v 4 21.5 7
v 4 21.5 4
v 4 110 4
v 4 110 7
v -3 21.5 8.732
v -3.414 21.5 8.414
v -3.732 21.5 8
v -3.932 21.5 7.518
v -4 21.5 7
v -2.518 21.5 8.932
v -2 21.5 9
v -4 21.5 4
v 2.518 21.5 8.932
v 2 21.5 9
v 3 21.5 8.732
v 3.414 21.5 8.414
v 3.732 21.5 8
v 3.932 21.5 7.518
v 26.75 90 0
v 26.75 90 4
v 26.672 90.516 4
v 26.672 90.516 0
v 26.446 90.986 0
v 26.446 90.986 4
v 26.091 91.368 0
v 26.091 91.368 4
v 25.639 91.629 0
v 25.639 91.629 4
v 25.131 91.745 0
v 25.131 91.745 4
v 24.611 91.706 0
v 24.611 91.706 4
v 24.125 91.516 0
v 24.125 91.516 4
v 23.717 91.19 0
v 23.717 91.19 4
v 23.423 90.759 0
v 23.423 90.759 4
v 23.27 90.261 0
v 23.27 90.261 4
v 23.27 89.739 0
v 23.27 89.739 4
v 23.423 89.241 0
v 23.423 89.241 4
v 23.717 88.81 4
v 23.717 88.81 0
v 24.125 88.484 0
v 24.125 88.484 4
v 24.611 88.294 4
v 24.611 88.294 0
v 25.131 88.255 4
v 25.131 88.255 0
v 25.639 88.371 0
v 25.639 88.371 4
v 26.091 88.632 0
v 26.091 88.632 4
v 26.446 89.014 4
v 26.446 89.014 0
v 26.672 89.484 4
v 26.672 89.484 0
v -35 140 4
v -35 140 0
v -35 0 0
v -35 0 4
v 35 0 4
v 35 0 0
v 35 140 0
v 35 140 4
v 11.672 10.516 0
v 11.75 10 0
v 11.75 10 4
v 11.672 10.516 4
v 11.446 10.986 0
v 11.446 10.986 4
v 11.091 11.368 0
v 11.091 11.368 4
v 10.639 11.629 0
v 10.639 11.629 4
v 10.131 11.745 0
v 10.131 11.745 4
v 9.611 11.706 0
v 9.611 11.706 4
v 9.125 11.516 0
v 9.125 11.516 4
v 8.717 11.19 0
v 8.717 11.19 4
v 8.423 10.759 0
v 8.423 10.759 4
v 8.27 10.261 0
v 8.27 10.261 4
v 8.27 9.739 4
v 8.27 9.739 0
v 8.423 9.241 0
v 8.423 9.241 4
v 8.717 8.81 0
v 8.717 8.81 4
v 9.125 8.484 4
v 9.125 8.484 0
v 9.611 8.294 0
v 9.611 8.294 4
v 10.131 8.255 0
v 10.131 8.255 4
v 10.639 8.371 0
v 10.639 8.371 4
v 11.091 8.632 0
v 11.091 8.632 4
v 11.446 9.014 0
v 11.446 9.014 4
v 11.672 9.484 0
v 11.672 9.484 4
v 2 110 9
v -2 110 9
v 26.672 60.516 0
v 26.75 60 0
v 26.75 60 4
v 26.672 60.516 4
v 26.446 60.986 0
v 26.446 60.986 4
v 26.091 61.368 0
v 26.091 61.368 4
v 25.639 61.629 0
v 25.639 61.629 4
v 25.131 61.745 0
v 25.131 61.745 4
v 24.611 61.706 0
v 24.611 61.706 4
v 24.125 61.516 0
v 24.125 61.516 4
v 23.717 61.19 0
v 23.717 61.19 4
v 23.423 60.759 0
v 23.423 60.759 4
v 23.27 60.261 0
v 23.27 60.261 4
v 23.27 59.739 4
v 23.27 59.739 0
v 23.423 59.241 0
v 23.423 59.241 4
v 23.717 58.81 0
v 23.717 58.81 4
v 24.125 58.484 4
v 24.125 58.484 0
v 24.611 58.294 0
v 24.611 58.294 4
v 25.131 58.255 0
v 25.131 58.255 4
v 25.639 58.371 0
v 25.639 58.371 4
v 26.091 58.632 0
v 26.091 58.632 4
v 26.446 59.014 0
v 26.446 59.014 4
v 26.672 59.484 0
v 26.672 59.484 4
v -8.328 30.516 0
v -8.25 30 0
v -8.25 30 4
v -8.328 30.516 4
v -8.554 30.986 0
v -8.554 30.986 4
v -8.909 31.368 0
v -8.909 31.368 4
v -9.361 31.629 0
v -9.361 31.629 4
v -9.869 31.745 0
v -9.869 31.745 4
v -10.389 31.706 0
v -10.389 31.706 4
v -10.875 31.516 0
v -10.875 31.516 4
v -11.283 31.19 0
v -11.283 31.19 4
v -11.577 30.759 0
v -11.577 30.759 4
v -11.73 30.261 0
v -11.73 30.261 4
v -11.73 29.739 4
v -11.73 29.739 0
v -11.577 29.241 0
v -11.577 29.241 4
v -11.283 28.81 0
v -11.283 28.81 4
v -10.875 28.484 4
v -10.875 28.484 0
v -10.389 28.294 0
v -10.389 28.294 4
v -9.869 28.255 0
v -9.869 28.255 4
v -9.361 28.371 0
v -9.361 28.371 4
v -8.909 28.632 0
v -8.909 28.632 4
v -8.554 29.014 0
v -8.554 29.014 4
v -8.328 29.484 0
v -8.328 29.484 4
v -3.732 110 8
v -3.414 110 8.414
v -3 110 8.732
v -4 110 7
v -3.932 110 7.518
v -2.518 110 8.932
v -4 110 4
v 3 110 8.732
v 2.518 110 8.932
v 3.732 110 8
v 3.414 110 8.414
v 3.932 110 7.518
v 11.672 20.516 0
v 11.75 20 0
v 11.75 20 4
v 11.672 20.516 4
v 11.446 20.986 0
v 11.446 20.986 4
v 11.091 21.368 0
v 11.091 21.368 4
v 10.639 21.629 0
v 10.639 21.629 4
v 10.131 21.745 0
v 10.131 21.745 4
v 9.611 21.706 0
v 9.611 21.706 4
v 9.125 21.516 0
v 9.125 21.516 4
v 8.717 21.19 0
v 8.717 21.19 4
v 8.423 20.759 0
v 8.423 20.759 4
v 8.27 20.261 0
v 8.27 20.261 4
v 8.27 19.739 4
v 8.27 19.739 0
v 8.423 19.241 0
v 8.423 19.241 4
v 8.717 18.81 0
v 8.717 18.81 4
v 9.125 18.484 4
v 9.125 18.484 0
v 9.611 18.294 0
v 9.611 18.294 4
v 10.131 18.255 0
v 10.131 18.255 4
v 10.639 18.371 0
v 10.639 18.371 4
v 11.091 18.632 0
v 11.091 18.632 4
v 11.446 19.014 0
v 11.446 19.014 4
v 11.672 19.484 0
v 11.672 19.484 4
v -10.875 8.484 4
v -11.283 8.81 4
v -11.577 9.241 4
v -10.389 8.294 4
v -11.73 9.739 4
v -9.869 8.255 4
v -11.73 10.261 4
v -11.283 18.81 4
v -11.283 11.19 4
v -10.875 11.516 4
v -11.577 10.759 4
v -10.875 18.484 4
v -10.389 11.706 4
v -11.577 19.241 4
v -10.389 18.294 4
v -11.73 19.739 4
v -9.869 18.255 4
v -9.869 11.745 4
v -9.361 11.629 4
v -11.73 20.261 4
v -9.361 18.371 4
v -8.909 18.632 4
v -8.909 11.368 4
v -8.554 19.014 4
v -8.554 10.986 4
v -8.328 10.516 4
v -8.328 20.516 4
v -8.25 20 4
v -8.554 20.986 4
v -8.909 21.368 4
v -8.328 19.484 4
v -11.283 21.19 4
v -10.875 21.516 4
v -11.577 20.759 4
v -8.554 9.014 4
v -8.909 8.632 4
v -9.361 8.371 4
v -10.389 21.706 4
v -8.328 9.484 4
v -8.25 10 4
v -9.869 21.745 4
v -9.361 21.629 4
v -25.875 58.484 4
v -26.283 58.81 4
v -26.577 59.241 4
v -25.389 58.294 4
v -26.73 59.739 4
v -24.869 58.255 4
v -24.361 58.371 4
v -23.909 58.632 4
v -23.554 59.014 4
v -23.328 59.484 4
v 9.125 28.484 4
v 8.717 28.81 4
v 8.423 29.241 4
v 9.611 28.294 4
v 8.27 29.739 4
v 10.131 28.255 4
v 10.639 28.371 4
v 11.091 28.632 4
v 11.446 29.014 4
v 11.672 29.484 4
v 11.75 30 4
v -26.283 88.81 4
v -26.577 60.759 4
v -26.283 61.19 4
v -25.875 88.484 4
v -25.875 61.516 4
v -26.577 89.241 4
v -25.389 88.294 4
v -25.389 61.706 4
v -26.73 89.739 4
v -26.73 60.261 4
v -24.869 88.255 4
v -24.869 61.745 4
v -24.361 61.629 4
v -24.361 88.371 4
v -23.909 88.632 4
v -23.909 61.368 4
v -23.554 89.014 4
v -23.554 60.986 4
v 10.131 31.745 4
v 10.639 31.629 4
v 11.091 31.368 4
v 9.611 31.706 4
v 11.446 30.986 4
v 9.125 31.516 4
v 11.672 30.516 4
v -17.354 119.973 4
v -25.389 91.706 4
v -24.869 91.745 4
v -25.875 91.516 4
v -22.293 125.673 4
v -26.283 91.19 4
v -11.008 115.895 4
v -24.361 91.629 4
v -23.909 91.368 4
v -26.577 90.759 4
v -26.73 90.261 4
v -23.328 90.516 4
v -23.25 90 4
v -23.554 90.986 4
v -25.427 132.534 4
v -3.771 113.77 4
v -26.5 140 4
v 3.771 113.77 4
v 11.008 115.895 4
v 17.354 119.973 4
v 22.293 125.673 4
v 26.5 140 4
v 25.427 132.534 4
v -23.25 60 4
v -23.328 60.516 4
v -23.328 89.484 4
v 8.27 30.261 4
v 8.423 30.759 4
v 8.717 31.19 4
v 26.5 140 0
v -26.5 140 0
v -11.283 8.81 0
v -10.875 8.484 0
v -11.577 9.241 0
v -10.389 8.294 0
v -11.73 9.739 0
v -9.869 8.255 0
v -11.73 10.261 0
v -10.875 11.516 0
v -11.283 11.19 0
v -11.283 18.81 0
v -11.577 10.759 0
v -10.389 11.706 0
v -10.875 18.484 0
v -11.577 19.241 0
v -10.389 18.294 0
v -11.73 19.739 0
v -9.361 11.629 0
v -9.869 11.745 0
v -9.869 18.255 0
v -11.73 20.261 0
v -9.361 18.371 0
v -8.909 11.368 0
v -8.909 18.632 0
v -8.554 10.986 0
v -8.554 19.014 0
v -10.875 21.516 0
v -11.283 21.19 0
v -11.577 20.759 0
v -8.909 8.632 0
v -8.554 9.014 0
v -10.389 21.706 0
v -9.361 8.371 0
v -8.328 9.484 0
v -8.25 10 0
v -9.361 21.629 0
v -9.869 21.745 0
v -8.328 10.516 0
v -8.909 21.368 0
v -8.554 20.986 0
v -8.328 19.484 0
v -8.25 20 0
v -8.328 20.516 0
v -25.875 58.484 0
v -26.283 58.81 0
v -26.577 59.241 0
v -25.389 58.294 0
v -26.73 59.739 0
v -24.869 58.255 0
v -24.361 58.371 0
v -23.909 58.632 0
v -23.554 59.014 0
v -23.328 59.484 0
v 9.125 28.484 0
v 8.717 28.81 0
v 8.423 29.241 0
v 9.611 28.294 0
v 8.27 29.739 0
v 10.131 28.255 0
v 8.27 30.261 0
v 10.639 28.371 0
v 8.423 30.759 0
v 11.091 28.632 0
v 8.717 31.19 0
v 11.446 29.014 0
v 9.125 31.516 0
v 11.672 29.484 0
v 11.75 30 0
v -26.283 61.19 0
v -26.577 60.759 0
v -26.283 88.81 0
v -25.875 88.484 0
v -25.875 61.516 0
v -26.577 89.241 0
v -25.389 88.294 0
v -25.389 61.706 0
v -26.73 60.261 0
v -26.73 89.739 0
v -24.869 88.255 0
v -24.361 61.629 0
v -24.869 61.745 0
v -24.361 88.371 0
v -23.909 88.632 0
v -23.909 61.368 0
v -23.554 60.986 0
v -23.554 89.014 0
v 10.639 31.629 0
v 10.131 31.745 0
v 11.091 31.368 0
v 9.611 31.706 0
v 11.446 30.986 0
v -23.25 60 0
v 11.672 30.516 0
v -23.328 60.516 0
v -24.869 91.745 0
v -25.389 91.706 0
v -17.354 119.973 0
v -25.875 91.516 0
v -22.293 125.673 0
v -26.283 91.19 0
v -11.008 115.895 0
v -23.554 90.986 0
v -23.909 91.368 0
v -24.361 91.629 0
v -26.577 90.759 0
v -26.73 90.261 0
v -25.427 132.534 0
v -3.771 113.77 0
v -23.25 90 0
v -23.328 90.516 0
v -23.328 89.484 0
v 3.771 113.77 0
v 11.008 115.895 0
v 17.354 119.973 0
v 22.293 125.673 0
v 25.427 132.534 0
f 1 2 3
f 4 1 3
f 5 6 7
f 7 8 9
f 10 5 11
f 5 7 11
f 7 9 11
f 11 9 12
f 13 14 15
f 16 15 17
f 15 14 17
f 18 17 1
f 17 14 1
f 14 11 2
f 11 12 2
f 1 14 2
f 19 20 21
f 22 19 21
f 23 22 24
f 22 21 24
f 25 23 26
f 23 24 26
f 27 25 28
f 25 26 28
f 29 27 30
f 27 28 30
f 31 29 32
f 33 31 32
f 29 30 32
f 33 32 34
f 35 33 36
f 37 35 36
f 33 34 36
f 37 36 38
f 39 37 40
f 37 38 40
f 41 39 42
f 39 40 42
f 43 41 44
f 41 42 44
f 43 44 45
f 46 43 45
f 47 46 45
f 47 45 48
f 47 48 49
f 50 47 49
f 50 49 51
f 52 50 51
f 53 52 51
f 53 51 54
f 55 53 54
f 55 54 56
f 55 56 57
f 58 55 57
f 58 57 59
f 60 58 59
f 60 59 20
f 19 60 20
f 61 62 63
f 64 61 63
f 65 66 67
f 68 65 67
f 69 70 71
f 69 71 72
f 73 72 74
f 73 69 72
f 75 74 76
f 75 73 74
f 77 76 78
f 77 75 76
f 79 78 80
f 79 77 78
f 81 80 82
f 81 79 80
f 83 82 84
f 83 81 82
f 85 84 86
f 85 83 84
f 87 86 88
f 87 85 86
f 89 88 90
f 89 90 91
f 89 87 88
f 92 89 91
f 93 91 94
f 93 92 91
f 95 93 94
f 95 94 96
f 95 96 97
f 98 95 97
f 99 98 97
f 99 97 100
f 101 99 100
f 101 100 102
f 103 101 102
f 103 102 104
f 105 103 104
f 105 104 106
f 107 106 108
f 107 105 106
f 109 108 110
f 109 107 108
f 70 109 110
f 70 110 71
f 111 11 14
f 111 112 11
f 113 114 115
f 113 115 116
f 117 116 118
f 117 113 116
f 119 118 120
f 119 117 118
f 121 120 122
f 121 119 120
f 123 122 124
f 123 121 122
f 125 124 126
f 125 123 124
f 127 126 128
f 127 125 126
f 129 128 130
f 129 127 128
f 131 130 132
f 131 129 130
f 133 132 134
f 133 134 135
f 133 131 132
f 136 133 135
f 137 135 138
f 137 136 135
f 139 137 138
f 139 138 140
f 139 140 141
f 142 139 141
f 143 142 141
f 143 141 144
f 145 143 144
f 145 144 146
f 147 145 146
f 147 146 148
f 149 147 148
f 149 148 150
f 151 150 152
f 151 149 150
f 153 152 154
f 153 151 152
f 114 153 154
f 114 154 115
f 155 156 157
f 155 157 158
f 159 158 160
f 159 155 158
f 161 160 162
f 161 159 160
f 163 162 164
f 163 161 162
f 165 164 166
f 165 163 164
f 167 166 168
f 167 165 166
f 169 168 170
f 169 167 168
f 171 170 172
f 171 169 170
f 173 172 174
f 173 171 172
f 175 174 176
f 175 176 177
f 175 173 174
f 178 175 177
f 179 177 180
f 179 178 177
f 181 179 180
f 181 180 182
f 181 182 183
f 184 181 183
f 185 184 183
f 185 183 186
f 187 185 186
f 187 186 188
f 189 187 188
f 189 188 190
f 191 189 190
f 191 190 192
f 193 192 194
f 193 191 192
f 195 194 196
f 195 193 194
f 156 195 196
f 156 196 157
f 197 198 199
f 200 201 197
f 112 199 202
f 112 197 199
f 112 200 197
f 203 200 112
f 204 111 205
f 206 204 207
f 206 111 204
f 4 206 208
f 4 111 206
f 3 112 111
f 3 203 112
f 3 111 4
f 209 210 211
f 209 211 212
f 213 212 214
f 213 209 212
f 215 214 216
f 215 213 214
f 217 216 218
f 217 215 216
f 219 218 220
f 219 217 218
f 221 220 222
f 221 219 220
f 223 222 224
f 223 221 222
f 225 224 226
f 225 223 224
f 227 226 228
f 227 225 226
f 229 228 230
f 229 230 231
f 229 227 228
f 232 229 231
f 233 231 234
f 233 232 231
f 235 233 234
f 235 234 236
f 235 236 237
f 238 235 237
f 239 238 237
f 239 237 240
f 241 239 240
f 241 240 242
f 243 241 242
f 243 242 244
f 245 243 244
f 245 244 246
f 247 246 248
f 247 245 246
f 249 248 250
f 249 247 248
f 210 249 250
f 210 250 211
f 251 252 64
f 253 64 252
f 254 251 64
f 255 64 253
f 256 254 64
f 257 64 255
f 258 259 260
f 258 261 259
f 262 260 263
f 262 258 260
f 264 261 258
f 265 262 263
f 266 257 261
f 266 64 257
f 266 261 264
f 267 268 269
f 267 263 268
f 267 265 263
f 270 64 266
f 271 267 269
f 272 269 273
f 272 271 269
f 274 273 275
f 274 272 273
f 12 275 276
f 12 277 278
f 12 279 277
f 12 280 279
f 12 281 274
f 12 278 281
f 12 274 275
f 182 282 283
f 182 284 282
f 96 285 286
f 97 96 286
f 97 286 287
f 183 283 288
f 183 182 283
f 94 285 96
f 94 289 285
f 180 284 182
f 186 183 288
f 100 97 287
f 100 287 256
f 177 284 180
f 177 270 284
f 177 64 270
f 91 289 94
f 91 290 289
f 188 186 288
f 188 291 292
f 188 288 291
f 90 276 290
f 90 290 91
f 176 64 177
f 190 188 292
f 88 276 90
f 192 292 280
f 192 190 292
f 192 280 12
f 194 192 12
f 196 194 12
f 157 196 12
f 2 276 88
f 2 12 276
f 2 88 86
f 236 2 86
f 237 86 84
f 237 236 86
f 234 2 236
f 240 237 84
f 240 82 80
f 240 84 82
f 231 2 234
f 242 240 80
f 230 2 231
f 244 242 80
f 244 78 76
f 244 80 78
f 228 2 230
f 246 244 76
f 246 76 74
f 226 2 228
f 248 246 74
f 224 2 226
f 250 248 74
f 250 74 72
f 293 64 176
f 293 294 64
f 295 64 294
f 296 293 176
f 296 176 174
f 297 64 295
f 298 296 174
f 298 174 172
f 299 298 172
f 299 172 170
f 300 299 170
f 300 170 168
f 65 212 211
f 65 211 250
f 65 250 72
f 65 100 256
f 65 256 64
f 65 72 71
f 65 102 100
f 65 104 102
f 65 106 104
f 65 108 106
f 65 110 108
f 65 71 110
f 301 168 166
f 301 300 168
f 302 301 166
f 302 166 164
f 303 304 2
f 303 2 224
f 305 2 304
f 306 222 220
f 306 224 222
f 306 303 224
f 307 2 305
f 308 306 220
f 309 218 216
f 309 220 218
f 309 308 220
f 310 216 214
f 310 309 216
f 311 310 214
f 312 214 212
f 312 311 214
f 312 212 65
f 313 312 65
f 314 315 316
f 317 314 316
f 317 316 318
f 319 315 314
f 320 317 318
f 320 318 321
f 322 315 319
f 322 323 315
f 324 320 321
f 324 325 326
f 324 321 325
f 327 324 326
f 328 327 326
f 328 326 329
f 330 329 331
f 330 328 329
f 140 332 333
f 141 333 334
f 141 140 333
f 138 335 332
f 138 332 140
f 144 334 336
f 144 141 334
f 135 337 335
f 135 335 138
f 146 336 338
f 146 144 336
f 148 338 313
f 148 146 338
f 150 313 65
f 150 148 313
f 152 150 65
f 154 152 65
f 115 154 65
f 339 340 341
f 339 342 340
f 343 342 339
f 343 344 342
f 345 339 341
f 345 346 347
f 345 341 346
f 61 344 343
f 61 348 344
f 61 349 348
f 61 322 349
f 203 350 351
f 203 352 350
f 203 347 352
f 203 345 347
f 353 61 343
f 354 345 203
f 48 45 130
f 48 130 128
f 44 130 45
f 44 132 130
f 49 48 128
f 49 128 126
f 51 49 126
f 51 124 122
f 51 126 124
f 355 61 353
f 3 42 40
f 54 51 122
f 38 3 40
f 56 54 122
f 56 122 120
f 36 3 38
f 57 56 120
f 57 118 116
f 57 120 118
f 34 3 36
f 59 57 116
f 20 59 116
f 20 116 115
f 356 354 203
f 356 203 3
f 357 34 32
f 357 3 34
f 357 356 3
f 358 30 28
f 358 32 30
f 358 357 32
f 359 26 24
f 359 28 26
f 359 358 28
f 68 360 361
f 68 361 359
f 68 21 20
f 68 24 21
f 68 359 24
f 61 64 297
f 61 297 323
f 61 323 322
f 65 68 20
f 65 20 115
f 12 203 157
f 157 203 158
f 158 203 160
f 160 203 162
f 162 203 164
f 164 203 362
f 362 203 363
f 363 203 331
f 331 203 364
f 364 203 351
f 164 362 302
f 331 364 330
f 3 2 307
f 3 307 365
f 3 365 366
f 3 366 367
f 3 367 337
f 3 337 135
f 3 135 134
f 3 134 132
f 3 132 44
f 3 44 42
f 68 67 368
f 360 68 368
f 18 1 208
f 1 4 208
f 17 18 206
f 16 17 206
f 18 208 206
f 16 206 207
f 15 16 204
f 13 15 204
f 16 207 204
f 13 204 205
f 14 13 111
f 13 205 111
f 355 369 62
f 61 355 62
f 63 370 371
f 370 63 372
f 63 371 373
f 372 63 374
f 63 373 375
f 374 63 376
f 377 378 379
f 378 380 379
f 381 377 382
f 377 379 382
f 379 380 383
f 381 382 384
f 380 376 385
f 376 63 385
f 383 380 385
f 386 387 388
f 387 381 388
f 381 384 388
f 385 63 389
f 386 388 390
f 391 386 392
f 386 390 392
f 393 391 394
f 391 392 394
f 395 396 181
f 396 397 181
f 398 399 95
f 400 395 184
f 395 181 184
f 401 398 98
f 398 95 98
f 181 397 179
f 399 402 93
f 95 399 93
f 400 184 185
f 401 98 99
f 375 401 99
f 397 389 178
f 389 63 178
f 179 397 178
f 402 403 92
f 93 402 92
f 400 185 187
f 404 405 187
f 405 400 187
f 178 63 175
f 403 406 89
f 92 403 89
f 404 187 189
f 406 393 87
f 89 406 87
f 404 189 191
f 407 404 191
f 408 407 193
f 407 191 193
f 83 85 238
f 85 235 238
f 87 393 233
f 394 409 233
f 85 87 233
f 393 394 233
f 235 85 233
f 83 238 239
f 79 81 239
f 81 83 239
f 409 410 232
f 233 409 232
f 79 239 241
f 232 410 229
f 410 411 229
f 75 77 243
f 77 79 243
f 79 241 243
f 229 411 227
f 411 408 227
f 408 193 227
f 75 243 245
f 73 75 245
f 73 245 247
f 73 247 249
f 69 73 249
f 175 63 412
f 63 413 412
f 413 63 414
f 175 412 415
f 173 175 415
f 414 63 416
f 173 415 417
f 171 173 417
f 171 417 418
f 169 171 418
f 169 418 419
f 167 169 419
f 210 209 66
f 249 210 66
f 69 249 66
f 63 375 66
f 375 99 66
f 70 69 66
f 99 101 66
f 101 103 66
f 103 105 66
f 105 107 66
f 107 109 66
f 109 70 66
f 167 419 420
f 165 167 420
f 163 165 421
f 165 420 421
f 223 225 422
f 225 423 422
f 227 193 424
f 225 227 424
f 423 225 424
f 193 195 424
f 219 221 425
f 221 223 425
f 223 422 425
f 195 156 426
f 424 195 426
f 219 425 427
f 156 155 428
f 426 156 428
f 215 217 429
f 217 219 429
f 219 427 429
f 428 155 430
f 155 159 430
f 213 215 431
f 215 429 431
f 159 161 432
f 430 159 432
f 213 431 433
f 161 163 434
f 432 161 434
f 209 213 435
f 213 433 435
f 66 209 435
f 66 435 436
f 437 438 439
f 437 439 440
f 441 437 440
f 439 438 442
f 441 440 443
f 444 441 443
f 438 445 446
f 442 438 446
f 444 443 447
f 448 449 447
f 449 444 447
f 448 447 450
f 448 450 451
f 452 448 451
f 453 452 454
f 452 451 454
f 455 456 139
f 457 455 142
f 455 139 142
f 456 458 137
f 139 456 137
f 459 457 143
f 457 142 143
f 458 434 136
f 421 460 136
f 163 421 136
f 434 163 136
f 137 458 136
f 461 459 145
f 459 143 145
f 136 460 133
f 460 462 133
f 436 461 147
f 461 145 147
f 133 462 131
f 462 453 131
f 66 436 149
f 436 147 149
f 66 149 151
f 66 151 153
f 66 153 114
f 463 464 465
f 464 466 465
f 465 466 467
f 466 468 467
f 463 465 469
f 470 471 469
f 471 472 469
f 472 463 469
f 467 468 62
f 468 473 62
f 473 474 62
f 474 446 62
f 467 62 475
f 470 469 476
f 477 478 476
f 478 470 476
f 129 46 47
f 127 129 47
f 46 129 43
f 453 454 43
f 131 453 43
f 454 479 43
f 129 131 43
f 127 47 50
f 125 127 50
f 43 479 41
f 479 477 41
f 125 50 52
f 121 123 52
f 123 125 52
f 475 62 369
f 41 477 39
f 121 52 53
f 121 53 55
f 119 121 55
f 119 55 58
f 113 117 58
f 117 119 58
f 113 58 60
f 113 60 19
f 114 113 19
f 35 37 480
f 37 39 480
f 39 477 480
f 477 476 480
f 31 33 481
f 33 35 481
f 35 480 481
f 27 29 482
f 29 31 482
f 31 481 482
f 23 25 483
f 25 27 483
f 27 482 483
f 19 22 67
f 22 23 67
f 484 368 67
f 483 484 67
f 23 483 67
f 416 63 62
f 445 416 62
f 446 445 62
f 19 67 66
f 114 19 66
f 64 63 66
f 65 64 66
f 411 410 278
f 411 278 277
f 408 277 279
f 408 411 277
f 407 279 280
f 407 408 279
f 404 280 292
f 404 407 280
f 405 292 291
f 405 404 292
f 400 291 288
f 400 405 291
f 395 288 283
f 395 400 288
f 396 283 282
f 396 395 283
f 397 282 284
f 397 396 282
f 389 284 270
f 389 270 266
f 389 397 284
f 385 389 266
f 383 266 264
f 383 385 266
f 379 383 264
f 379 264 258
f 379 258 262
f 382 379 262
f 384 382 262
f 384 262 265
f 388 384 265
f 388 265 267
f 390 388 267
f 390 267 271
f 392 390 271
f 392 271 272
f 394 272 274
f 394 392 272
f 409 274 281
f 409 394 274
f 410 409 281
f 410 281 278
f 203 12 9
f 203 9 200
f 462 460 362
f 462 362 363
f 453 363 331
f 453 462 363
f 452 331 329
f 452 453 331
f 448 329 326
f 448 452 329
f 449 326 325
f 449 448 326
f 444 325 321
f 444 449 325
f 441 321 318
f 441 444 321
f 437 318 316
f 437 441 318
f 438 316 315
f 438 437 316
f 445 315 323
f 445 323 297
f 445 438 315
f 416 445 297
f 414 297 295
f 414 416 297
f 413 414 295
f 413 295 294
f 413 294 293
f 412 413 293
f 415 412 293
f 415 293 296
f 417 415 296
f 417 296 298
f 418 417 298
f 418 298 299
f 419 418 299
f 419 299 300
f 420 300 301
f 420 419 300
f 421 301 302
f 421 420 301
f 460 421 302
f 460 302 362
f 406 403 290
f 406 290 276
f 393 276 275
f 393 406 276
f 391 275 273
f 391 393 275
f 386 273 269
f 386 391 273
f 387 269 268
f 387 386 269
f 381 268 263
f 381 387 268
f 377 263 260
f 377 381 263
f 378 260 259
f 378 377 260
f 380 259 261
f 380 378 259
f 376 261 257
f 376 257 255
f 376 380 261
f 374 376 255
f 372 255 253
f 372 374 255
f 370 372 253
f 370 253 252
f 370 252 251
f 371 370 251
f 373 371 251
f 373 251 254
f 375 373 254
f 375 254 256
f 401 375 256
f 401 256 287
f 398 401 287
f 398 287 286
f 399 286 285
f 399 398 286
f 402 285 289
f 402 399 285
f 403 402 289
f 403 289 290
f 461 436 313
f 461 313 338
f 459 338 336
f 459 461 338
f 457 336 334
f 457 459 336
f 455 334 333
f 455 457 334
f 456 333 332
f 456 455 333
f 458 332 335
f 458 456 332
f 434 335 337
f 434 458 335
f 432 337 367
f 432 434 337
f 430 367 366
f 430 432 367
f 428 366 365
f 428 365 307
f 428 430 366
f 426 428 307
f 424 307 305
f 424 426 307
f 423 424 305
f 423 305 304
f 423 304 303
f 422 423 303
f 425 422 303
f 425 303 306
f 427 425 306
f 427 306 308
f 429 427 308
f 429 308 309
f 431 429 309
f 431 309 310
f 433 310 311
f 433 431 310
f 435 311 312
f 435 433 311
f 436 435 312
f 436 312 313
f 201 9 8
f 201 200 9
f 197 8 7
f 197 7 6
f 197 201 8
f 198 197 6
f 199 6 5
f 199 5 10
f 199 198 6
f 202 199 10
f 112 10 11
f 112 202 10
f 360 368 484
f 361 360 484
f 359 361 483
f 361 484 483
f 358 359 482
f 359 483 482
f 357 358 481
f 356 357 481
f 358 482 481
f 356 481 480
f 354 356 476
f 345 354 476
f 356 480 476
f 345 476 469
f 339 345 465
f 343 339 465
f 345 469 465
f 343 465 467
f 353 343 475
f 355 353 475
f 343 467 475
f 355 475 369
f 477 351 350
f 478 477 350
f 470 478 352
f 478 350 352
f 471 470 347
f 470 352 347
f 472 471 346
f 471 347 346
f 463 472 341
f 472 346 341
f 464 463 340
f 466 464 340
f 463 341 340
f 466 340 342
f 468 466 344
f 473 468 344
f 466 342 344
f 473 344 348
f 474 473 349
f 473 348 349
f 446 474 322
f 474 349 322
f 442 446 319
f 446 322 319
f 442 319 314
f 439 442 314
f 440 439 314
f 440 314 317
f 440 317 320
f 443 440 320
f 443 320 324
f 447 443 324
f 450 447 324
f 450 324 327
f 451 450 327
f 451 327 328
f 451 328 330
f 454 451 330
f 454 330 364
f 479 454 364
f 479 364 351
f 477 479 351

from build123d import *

# Parameters (mm, degrees)
SKETCH1_R           = 1.75
BOSS_EXTRUDE1_DEPTH = 4
SKETCH2_W           = 8
SKETCH2_H           = 88.5
BOSS_EXTRUDE2_DEPTH = 5
FILLET1_R           = 2
SKETCH3_R           = 1.75
CUT_EXTRUDE1_DEPTH  = 145.395290782


with BuildPart() as part:
    # Sketch1 → Boss-Extrude1 (new body)
    with BuildSketch(Plane.XY):
        with BuildLine():
            Line((-26.5, 140), (-35, 140))
            Line((-35, 140), (-35, 0))
            Line((-35, 0), (35, 0))
            Line((35, 0), (35, 140))
            Line((35, 140), (26.5, 140))
            ThreePointArc((26.5, 140), (0, 113.5), (-26.5, 140))
        make_face()
        with Locations((-25, 60)):
            Circle(SKETCH1_R, mode=Mode.SUBTRACT)
        with Locations((25, 60)):
            Circle(SKETCH1_R, mode=Mode.SUBTRACT)
        with Locations((-10, 10)):
            Circle(SKETCH1_R, mode=Mode.SUBTRACT)
        with Locations((10, 10)):
            Circle(SKETCH1_R, mode=Mode.SUBTRACT)
        with Locations((10, 20)):
            Circle(SKETCH1_R, mode=Mode.SUBTRACT)
        with Locations((-10, 20)):
            Circle(SKETCH1_R, mode=Mode.SUBTRACT)
        with Locations((10, 30)):
            Circle(SKETCH1_R, mode=Mode.SUBTRACT)
        with Locations((-10, 30)):
            Circle(SKETCH1_R, mode=Mode.SUBTRACT)
    extrude(amount=BOSS_EXTRUDE1_DEPTH)

    # Sketch2 → Boss-Extrude2 (add)
    with BuildSketch(Plane.XY.offset(4)):
        with Locations((0, 65.75)):
            Rectangle(SKETCH2_W, SKETCH2_H)
    extrude(amount=BOSS_EXTRUDE2_DEPTH)

    # Fillet1
    fillet1_edges = [part.edges().sort_by_distance(p)[0] for p in [
        (-4, 65.75, 9),
        (4, 65.75, 9),
    ]]
    fillet(fillet1_edges, radius=FILLET1_R)

    # Sketch3 → Cut-Extrude1 (cut, through all)
    with BuildSketch(Plane.XY.offset(4)):
        with Locations((-25, 90)):
            Circle(SKETCH3_R)
        with Locations((25, 90)):
            Circle(SKETCH3_R)
    extrude(amount=-CUT_EXTRUDE1_DEPTH, mode=Mode.SUBTRACT)


solid = part.part
